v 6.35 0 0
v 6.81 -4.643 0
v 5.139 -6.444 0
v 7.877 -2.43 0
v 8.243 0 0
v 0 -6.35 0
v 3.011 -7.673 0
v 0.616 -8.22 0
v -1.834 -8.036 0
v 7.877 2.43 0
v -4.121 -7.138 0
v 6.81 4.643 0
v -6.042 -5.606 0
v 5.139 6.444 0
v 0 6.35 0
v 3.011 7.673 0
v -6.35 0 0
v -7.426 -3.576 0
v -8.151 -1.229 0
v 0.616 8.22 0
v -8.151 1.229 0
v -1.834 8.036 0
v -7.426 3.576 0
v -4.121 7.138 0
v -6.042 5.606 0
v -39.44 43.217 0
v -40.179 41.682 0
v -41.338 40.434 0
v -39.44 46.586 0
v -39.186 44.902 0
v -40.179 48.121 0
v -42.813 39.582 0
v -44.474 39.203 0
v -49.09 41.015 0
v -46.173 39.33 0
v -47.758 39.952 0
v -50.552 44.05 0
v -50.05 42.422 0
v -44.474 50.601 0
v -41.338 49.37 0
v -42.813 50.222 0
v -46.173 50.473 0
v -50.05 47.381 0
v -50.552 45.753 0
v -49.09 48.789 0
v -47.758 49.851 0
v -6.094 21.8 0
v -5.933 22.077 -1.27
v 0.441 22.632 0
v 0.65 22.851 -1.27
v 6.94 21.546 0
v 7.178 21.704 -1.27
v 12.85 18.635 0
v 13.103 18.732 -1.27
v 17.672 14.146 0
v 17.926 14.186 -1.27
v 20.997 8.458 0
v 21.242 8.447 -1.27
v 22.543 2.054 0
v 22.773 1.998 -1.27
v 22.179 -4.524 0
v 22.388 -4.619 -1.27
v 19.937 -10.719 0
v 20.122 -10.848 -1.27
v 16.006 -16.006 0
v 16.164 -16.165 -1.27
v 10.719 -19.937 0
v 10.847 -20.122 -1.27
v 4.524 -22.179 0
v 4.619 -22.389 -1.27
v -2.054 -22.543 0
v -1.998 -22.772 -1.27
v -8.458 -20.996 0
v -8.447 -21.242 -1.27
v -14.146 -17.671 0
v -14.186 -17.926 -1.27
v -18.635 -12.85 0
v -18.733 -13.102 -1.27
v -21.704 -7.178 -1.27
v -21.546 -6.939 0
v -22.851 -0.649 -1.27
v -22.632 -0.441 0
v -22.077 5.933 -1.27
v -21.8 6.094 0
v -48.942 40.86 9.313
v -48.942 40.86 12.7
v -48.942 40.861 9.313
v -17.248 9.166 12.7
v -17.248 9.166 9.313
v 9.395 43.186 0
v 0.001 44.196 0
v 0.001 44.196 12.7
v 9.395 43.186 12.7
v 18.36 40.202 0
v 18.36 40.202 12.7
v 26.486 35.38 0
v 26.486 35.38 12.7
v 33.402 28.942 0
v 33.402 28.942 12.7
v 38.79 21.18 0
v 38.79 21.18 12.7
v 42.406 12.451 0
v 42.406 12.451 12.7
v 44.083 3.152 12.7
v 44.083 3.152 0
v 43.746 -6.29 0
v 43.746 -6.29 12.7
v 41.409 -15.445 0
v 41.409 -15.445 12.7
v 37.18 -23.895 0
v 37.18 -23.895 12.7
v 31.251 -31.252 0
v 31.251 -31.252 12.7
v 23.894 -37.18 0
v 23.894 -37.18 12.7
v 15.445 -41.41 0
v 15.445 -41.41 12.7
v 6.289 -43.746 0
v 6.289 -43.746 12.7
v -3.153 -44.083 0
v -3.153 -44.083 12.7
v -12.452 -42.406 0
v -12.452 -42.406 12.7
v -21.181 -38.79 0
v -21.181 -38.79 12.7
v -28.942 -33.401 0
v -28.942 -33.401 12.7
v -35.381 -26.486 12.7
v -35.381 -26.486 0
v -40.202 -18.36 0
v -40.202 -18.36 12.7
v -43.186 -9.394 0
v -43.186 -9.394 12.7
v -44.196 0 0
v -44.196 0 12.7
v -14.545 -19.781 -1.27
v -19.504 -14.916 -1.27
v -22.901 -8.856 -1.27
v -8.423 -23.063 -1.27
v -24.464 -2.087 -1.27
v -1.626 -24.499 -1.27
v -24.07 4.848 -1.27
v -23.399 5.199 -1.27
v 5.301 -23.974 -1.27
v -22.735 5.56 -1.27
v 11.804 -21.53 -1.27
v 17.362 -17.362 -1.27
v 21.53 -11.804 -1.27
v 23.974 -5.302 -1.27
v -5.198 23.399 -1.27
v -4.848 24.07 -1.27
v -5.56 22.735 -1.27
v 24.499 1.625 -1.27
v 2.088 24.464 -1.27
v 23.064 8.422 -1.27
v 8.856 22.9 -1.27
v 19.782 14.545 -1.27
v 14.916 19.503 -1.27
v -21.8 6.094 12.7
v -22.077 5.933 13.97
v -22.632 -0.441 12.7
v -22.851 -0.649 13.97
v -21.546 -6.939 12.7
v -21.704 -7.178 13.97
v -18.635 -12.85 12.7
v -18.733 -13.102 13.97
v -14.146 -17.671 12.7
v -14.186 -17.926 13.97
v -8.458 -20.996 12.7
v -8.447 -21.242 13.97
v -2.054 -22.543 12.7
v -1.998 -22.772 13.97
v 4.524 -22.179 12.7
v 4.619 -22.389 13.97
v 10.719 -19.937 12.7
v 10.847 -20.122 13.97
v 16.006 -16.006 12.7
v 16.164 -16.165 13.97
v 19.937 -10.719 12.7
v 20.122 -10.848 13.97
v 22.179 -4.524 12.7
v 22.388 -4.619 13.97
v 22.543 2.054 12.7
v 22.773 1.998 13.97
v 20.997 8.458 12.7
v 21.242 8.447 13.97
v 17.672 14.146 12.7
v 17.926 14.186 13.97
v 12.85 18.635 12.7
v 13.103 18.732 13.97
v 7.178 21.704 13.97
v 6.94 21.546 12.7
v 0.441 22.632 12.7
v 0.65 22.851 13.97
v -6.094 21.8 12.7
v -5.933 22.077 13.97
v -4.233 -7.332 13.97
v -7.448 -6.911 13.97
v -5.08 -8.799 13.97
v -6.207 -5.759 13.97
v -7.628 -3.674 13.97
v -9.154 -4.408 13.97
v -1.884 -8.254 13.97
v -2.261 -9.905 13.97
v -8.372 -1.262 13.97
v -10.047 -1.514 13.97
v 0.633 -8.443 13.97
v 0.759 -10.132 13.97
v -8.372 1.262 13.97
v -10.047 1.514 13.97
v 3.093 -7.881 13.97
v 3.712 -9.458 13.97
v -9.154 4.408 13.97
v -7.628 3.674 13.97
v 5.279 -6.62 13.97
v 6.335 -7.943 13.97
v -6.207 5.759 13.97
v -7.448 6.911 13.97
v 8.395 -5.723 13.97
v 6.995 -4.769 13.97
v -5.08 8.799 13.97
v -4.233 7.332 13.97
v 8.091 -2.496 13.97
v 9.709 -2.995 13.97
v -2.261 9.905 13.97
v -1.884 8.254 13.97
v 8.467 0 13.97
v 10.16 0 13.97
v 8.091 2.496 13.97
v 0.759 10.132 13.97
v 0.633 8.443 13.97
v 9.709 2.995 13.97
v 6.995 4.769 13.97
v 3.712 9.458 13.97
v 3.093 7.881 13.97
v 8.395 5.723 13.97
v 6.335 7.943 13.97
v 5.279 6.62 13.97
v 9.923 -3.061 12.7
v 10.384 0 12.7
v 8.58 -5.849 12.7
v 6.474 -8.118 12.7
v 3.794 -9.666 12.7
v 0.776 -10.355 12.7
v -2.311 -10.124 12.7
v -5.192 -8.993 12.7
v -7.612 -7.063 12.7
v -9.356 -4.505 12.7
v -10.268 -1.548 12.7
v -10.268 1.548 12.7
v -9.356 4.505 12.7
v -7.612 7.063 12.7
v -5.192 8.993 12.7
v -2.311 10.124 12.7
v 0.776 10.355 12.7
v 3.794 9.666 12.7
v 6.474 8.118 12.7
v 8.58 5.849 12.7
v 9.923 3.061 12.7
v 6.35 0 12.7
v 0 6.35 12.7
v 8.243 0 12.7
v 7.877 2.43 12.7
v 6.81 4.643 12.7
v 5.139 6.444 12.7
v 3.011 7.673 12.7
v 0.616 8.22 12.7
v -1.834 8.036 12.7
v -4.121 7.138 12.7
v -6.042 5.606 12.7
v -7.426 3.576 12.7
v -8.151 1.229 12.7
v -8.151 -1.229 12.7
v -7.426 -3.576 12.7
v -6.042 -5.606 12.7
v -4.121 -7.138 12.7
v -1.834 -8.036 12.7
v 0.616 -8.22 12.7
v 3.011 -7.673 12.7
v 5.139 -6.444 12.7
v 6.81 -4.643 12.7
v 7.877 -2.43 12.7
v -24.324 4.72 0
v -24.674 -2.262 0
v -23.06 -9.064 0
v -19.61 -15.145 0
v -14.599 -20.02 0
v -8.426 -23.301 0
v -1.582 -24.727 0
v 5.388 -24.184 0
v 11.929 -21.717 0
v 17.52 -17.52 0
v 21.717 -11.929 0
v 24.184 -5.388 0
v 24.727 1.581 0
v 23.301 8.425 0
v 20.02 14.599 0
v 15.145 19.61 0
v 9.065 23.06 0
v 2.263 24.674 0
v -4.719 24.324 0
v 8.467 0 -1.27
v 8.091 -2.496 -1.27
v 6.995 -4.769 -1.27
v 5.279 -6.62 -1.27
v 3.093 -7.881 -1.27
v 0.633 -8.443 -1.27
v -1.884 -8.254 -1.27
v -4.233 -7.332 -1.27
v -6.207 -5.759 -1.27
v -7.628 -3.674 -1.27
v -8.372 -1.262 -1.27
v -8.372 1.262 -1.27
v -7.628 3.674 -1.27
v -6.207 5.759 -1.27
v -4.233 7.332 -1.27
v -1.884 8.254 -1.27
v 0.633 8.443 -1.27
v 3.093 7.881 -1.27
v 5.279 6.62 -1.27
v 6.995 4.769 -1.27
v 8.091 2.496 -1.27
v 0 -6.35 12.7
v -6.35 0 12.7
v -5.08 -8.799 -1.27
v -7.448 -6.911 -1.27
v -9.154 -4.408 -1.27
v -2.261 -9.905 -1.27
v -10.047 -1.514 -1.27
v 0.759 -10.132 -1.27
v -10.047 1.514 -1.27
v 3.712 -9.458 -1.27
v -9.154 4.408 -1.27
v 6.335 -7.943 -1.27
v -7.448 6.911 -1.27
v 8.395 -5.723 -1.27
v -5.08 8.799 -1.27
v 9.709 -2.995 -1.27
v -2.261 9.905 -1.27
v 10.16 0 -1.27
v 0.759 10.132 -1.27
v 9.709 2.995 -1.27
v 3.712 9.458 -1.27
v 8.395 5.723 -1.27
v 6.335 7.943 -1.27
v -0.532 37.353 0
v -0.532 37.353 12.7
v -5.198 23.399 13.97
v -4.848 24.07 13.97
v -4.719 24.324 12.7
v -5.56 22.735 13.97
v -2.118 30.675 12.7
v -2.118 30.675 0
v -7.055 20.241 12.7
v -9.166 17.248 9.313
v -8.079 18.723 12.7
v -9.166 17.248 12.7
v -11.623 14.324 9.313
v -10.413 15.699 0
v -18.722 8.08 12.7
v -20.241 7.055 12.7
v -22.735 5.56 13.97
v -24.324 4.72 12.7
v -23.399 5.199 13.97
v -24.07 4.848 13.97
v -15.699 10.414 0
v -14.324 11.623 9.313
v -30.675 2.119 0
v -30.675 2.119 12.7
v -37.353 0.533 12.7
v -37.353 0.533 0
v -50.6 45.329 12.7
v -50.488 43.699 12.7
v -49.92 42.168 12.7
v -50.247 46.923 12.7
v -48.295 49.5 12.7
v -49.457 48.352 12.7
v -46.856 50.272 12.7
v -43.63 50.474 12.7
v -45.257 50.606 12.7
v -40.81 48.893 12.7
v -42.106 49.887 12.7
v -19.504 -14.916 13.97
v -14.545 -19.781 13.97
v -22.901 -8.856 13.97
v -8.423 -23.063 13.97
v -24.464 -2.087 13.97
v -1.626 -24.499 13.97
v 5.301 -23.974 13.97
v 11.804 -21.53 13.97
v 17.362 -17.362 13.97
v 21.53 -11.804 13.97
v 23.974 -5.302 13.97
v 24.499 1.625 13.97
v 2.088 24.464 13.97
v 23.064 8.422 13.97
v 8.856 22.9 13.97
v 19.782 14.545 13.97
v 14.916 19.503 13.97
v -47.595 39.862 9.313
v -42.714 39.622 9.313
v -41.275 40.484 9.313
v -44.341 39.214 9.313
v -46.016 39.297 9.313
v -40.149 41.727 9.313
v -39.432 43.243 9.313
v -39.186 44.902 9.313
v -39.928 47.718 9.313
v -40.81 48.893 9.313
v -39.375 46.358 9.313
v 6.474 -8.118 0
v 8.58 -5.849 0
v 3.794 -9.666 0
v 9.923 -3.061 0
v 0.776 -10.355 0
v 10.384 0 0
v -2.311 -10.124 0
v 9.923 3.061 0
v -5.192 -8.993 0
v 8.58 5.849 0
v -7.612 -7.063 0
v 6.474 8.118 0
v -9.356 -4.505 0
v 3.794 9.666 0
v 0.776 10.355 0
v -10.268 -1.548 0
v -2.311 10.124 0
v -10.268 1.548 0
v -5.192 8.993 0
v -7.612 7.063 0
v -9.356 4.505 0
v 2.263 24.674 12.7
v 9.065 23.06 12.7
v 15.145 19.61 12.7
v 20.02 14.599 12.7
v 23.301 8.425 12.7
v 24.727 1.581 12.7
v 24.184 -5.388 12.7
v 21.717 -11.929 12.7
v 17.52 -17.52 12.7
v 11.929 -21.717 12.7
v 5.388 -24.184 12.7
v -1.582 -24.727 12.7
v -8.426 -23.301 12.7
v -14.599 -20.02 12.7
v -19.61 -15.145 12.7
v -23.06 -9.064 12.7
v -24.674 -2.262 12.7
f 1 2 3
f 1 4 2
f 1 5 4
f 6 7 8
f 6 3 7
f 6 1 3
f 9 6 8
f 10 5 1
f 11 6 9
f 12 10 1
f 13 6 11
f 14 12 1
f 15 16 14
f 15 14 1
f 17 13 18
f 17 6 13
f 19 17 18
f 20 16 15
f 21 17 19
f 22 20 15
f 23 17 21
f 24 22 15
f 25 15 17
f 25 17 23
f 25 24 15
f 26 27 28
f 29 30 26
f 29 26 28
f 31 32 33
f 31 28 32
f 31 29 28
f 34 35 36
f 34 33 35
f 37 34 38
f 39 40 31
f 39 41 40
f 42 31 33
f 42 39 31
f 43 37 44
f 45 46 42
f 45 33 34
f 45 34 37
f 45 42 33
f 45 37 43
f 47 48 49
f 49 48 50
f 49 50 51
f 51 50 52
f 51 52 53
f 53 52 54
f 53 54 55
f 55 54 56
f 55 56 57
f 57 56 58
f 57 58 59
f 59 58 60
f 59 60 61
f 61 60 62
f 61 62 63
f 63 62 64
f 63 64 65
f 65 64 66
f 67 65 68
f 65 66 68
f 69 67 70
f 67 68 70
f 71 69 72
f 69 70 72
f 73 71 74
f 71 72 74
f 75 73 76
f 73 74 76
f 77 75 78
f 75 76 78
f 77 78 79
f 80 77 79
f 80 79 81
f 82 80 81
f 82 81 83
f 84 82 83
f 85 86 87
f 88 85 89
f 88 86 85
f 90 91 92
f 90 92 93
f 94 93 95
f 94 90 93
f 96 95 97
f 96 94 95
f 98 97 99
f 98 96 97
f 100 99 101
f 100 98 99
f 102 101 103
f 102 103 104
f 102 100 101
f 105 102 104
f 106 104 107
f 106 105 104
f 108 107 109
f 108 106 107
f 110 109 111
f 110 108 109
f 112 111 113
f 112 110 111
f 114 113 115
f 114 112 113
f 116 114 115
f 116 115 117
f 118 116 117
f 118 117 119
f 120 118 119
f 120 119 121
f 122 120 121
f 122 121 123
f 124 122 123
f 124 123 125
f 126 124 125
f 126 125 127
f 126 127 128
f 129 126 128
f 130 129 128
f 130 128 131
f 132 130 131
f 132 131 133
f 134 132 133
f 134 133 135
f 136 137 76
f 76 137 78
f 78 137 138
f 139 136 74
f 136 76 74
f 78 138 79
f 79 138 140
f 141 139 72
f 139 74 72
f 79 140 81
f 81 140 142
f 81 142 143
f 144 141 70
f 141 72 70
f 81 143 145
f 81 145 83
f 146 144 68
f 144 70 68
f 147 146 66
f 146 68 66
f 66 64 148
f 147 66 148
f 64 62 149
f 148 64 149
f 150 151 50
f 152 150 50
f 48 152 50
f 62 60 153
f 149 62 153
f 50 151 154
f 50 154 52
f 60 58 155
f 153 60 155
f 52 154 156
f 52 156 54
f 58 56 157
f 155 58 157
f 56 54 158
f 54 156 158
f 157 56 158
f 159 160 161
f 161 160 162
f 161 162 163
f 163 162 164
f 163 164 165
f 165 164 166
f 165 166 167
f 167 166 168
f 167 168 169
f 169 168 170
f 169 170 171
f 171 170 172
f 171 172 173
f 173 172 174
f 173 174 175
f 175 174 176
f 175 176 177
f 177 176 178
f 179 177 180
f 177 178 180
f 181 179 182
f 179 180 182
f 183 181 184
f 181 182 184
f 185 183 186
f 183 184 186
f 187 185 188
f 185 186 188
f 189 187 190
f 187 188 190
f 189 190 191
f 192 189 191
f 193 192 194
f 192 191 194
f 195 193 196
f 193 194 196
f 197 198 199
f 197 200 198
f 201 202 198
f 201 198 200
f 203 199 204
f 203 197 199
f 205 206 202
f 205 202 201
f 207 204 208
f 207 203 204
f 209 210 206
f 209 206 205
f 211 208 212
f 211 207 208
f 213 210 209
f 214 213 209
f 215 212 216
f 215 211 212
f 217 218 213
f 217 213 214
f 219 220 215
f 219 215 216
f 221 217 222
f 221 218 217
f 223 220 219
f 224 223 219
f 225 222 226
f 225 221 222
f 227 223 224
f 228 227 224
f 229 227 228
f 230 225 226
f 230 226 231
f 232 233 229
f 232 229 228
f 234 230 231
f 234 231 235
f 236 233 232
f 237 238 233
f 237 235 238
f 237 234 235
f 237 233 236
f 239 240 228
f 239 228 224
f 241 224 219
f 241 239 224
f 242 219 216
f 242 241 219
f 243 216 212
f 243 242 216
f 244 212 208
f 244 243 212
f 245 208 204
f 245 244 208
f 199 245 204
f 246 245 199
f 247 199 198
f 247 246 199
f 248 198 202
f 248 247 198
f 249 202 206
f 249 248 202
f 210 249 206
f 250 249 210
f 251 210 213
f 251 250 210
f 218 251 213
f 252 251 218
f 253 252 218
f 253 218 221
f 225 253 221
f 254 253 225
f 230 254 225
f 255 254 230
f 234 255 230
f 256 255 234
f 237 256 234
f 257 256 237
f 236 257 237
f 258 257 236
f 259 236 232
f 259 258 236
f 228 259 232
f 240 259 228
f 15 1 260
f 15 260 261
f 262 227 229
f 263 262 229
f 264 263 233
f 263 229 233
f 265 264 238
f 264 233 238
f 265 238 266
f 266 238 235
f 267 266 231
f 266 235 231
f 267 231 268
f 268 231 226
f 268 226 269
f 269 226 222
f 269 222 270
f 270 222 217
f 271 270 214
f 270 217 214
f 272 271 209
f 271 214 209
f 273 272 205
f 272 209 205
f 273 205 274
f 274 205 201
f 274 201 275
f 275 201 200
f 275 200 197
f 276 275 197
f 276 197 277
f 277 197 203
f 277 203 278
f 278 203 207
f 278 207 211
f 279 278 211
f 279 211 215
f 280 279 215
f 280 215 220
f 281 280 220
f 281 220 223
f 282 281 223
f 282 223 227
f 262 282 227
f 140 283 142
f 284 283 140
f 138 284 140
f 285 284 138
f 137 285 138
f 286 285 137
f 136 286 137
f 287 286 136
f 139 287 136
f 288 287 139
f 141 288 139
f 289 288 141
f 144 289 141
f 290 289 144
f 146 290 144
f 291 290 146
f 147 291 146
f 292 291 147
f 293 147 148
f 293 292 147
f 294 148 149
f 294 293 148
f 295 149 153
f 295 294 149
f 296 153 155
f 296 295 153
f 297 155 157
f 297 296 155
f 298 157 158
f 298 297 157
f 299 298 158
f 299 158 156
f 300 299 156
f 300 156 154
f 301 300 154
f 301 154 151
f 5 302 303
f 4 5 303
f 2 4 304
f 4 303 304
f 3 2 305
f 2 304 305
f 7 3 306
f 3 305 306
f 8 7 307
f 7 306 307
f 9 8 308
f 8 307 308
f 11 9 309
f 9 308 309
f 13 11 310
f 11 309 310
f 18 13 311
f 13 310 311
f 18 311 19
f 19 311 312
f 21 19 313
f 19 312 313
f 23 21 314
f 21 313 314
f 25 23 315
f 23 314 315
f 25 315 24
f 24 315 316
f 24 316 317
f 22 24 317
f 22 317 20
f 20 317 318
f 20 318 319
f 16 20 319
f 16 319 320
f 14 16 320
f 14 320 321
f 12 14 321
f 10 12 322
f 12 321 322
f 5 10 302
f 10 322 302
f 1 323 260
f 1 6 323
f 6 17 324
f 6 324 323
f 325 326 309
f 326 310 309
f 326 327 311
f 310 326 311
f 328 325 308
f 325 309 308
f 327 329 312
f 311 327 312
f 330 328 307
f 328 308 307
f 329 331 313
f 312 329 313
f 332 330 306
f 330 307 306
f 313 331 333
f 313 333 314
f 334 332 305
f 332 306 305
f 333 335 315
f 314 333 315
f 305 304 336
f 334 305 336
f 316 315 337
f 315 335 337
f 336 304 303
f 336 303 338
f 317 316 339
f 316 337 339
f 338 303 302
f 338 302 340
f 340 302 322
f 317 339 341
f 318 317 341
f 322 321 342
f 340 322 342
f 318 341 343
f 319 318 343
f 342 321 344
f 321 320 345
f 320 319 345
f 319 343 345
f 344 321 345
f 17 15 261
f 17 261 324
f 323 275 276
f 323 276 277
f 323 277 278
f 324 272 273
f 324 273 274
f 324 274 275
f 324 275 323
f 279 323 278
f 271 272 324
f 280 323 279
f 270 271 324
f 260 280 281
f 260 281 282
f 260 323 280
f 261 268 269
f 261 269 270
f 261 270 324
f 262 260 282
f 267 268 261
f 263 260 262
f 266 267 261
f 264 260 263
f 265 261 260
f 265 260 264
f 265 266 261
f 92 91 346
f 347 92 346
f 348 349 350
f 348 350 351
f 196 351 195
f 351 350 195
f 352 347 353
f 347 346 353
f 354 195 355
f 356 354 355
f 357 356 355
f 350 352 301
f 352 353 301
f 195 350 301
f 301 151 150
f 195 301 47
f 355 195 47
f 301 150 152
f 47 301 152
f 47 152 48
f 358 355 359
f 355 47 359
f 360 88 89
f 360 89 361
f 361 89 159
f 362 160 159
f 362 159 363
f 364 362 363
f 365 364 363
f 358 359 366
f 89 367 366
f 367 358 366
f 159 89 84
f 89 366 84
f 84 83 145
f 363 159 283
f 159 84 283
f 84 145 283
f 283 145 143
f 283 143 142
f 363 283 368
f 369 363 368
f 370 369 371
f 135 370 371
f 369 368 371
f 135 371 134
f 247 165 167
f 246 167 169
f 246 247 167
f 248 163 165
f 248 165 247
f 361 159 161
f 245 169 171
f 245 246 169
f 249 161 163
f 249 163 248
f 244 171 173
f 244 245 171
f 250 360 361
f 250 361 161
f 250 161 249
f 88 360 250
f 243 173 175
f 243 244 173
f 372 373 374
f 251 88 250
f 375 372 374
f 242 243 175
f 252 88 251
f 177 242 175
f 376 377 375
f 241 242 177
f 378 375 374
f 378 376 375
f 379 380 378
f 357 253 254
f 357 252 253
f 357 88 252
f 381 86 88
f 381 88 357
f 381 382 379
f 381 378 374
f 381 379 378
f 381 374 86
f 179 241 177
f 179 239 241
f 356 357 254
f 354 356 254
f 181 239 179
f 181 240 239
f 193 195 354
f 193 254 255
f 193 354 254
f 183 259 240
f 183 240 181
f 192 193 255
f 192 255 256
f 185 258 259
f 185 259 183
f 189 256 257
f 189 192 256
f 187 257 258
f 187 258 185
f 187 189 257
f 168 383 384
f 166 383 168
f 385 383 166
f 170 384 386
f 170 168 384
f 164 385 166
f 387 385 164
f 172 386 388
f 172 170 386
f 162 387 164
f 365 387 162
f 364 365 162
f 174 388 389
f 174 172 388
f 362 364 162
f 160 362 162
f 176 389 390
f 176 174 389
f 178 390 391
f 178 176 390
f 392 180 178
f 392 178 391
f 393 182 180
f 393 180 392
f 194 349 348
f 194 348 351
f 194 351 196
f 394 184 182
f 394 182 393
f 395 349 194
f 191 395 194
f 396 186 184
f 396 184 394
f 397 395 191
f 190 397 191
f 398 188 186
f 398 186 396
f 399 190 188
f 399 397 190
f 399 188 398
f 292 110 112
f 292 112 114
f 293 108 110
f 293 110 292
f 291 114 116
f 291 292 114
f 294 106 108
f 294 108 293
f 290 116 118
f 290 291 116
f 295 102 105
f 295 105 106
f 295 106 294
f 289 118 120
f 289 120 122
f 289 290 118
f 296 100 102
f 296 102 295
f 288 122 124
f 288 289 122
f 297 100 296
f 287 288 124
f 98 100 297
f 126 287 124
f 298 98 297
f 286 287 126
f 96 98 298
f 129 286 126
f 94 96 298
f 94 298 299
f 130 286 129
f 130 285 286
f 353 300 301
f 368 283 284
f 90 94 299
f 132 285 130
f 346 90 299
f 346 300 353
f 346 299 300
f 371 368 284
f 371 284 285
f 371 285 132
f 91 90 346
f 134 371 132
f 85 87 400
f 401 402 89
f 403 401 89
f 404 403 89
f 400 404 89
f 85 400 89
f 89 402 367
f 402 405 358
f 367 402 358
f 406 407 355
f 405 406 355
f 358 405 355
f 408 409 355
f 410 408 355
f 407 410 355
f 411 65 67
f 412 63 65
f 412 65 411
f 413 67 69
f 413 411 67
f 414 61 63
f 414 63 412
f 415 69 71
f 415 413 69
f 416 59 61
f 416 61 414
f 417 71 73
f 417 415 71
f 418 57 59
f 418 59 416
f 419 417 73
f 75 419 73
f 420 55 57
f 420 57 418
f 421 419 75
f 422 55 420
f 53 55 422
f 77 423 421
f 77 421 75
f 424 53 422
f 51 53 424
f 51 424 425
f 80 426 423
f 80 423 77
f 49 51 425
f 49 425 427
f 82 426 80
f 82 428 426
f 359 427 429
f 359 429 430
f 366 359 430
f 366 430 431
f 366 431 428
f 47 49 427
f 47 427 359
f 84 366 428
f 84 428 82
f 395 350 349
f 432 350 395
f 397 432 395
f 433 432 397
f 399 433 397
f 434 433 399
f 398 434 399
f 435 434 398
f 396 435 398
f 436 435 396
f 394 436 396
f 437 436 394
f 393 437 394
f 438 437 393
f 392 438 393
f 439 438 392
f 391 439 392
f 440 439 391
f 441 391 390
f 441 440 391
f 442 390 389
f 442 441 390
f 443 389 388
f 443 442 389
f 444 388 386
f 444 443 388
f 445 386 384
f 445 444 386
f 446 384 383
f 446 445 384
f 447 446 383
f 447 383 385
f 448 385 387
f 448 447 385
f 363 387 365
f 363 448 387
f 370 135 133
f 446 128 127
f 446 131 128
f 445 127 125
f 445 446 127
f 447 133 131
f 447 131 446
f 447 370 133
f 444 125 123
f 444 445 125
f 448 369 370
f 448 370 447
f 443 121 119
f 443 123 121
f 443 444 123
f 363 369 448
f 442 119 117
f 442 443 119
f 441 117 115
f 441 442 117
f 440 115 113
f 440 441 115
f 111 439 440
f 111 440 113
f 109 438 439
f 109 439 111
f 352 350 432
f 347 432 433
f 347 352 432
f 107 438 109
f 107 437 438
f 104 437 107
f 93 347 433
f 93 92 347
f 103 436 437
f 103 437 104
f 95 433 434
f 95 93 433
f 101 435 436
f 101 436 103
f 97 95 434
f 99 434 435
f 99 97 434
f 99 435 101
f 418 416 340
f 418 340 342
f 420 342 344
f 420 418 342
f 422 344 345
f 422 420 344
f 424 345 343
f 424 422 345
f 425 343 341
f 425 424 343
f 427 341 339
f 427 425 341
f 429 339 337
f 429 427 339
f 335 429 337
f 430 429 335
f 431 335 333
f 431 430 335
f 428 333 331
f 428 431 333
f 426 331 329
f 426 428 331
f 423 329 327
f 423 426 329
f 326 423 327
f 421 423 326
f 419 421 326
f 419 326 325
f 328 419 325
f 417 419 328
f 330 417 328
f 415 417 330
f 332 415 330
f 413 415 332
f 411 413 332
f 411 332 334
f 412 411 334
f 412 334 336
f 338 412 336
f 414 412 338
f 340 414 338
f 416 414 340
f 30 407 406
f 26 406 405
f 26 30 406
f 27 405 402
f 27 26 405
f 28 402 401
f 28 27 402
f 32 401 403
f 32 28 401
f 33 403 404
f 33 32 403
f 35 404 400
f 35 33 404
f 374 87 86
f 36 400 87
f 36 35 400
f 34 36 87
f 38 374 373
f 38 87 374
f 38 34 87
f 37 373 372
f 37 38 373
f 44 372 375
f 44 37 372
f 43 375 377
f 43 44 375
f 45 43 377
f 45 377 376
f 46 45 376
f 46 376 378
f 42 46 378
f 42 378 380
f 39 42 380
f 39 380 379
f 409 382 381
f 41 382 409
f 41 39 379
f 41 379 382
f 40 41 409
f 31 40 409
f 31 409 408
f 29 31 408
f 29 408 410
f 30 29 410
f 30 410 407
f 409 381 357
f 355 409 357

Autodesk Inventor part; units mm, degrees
ref_plane "YZ Plane" through (0, 0, 0) normal (1, 0, 0) x (0, 1, 0)
ref_plane "XZ Plane" through (0, 0, 0) normal (0, 1, 0) x (-1, 0, 0)
ref_plane "XY Plane" through (0, 0, 0) normal (0, 0, 1) x (1, 0, 0)
sketch "Sketch1" plane through (0, 0, 0) normal (0, 0, 1) x (1, 0, 0)
  line L0 (0, 0) -> (-89.8017, 0) construction
  line L1 (-89.8017, 0) -> (-44.90085, 44.901711) construction
  line L2 (-44.90085, 44.901711) -> (0, 0) construction
  arc A0 (-44.196, 0) -> (0.000848, 44.196) centre (0, 0) ccw
  line L3 (-44.196, 0) -> (-44.196, 44.196848) construction
  line L4 (-44.196, 44.196848) -> (-44.90085, 44.901711) construction
  circle A1 centre (-44.90085, 44.901711) radius 5.715
  arc A2 (-44.196, 0) -> (0.000848, 44.196) centre (-44.196, 44.196848) ccw
  dimension "d8" = 89.8017
  dimension "d9" = 63.5
  dimension "d10" = 63.5
  dimension "d11" = 44.196
  dimension "d12" = 11.43
extrude "Extrusion1" add sketch "Sketch1" along normal blind 13.97 and the other way blind 1.27
sketch "Sketch5" plane through (0, 0, 13.97) normal (0, 0, 1) x (1, 0, 0)
  line L0 (2.846729, 10.62373) -> (7.777055, -7.777205)
  line L1 (7.777055, -7.777205) -> (-10.623784, -2.846525)
  line L2 (-10.623784, -2.846525) -> (2.846729, 10.62373)
  line L3 (0, 0) -> (-12.944409, 12.944657) construction
  arc A0 (-44.196, 0) -> (0.000848, 44.196) centre (-44.196, 44.196848) ccw
  dimension "d31" = 19.05
extrude "Extrusion4" cut sketch "Sketch5" against normal through all
sketch "Sketch6" plane through (0, 0, -1.27) normal (0, 0, -1) x (-1, 0, 0)
  circle A0 centre (0, 0) radius 6.35
  dimension "d34" = 12.7
extrude "Extrusion5" add sketch "Sketch6" along normal blind 8.466667 and the other way blind 21.166667
sketch "Sketch7" plane through (0, 0, 13.97) normal (0, 0, 1) x (1, 0, 0)
  circle A0 centre (0, 0) radius 12.7
  dimension "d39" = 25.4
extrude "Extrusion6" add sketch "Sketch7" against normal up to surface (15.24 mm away)
sketch "Sketch8" plane through (0, 0, -9.736667) normal (0, 0, -1) x (-1, 0, 0)
  circle A0 centre (0, 0) radius 6.35
  line L0 (4.490085, 4.490171) -> (1.64356, -6.133613)
  line L1 (1.64356, -6.133613) -> (-6.133645, 1.643442)
  line L2 (-6.133645, 1.643442) -> (4.490085, 4.490171)
  circle A1 centre (44.90085, 44.901711) radius 5.715
  line L3 (44.90085, 44.901711) -> (0, 0)
extrude "Extrusion7" add sketch "Sketch8" along normal blind 12.7 contours L0 L1 L2
ref_plane "Work Plane1" through (-44.90085, 44.901711, 7.196667) normal (0, 0, -1) x (-1, 0, 0)
sketch "Sketch9" plane through (0, 0, 19.896667) normal (0, 0, 1) x (1, 0, 0)
  circle A0 centre (0, 0) radius 6.35 projected
extrude "Extrusion8" add sketch "Sketch9" along normal blind 1.27
sketch "Sketch10" plane through (0, 0, 13.97) normal (0, 0, 1) x (1, 0, 0)
  circle A0 centre (0, 0) radius 6.35 projected
extrude "Extrusion9" add sketch "Sketch10" along normal blind 8.466667
sketch "Sketch11" plane through (0, 0, 13.97) normal (0, 0, 1) x (1, 0, 0)
  circle A0 centre (0, 0) radius 8.466667
  circle A1 centre (0, 0) radius 10.16
  arc A2 (-44.196, 0) -> (0.000848, 44.196) centre (-44.196, 44.196848) ccw
  arc A3 (-22.076558, 5.933398) -> (-5.932974, 22.076671) centre (0, 0) ccw
  arc A4 (-24.069883, 4.848395) -> (-4.847933, 24.069976) centre (0, 0) ccw
  arc A5 (-44.196, 0) -> (0.000848, 44.196) centre (0, 0) ccw
  circle A6 centre (0, 0) radius 50.8
  point P0 (-37.249283, 0.549345)
  point P1 (-0.548631, 37.249293)
  point P2 (-38.945409, 0.312994)
  point P3 (-0.312247, 38.945415)
  dimension "d51" = 16.93333
  dimension "d52" = 1.69333
  dimension "d53" = 1.69333
  dimension "d55" = 12.7
  dimension "d61" = 101.6
sketch "Sketch11 outline for Extrusion10" plane through (0, 0, 13.97) normal (0, 0, 1) x (1, 0, 0)
  circle A0 centre (0, 0) radius 50.8
  circle A1 centre (0, 0) radius 10.16
  arc A2 (-5.932974, 22.076671) -> (-22.076558, 5.933398) centre (0, 0) cw
  arc A3 (-22.076558, 5.933398) -> (-24.069883, 4.848395) centre (-44.196, 44.196848) cw
  arc A4 (-24.069883, 4.848395) -> (-4.847933, 24.069976) centre (0, 0) ccw
  arc A5 (-4.847933, 24.069976) -> (-5.932974, 22.076671) centre (-44.196, 44.196848) cw
  circle A6 centre (0, 0) radius 8.466667
extrude "Extrusion10" cut sketch "Sketch11 outline for Extrusion10" against normal blind 1.27 draft -10
sketch "Sketch12" plane through (0, 0, 22.436667) normal (0, 0, 1) x (1, 0, 0)
  circle A0 centre (0, 0) radius 6.35 projected
extrude "Extrusion11" add sketch "Sketch12" against normal up to surface (9.736667 mm away)
ref_plane "Work Plane2" through (0, 0, 6.35) normal (0, 0, 1) x (1, 0, 0)
mirror "Mirror1" about plane through (0, 0, 6.35) normal (0, 0, 1) of "Extrusion10"
sketch "Sketch14" plane through (-44.90085, 44.901711, -1.27) normal (0, 0, -1) x (-1, 0, 0)
  circle A0 centre (0, 0) radius 5.715 projected
  point P0 (-44.90085, -44.901711)
extrude "Extrusion12" cut sketch "Sketch14" against normal blind 1.27
sketch "Sketch15" plane through (-44.90085, 44.901711, 13.97) normal (0, 0, 1) x (1, 0, 0)
  circle A0 centre (0, 0) radius 5.715 projected
  point P0 (44.90085, -44.901711)
extrude "Extrusion13" cut sketch "Sketch15" against normal blind 1.27
ref_plane "Work Plane3" through (-12.944409, 12.944657, 0) normal (-0.7071136, -0.7071, 0) x (0.7071, -0.7071136, 0)
sketch "Sketch17" plane through (-12.944409, 12.944657, 0) normal (-0.7071136, -0.7071, 0) x (0.7071, -0.7071136, 0)
  line L0 (-50.908666, 12.7) -> (-39.478666, 12.7)
  line L1 (-39.478666, 12.7) -> (0, 12.7)
  line L2 (0, 12.7) -> (0, 9.313333)
  line L3 (0, 9.313333) -> (-39.478666, 9.313333)
  line L4 (-39.478666, 9.313333) -> (-39.478666, 12.7)
  line L5 (0, 12.7) -> (0, 0)
  line L6 (-39.478666, 12.7) -> (-45.193666, 12.7)
  line L7 (-45.193666, 12.7) -> (-45.193666, 9.313333)
  line L8 (-45.193666, 9.313333) -> (-39.478666, 9.313333)
  line L9 (-39.478666, 9.313333) -> (-39.478666, 12.7)
  line L10 (-39.478666, 0) -> (-50.908666, 0)
  point P0 (18.306334, 0)
  point P1 (-45.193666, 0)
  dimension "d69" = 3.38667
extrude "Extrusion14" add sketch "Sketch17" along normal mid plane 11.43
sketch "Sketch18" plane through (0, 0, -22.436667) normal (0, 0, -1) x (-1, 0, 0)
  circle A0 centre (0, 0) radius 6.35
  dimension "d72" = 12.7
extrude "Extrusion15" cut sketch "Sketch18" against normal through all
sketch "Sketch19" plane through (0, 0, 0) normal (0, 0, -1) x (-1, 0, 0)
  circle A0 centre (0, 0) radius 6.35
  line L0 (6.35, 0.000061) -> (0.000061, -6.35)
  line L1 (0.000061, -6.35) -> (-6.35, -0.000061)
  line L2 (-6.35, -0.000061) -> (-0.000061, 6.35)
  line L3 (-0.000061, 6.35) -> (6.35, 0.000061)
  circle A1 centre (44.90085, 44.901711) radius 5.715 construction
  line L4 (44.90085, 44.901711) -> (0, 0) construction
extrude "Extrusion16" add sketch "Sketch19" against normal up to surface (12.7 mm away) contours L3 A0 | A0 L0 | L2 A0 | A0 L1
properties part number "Geneva Drive" material "ABS Plastic"
